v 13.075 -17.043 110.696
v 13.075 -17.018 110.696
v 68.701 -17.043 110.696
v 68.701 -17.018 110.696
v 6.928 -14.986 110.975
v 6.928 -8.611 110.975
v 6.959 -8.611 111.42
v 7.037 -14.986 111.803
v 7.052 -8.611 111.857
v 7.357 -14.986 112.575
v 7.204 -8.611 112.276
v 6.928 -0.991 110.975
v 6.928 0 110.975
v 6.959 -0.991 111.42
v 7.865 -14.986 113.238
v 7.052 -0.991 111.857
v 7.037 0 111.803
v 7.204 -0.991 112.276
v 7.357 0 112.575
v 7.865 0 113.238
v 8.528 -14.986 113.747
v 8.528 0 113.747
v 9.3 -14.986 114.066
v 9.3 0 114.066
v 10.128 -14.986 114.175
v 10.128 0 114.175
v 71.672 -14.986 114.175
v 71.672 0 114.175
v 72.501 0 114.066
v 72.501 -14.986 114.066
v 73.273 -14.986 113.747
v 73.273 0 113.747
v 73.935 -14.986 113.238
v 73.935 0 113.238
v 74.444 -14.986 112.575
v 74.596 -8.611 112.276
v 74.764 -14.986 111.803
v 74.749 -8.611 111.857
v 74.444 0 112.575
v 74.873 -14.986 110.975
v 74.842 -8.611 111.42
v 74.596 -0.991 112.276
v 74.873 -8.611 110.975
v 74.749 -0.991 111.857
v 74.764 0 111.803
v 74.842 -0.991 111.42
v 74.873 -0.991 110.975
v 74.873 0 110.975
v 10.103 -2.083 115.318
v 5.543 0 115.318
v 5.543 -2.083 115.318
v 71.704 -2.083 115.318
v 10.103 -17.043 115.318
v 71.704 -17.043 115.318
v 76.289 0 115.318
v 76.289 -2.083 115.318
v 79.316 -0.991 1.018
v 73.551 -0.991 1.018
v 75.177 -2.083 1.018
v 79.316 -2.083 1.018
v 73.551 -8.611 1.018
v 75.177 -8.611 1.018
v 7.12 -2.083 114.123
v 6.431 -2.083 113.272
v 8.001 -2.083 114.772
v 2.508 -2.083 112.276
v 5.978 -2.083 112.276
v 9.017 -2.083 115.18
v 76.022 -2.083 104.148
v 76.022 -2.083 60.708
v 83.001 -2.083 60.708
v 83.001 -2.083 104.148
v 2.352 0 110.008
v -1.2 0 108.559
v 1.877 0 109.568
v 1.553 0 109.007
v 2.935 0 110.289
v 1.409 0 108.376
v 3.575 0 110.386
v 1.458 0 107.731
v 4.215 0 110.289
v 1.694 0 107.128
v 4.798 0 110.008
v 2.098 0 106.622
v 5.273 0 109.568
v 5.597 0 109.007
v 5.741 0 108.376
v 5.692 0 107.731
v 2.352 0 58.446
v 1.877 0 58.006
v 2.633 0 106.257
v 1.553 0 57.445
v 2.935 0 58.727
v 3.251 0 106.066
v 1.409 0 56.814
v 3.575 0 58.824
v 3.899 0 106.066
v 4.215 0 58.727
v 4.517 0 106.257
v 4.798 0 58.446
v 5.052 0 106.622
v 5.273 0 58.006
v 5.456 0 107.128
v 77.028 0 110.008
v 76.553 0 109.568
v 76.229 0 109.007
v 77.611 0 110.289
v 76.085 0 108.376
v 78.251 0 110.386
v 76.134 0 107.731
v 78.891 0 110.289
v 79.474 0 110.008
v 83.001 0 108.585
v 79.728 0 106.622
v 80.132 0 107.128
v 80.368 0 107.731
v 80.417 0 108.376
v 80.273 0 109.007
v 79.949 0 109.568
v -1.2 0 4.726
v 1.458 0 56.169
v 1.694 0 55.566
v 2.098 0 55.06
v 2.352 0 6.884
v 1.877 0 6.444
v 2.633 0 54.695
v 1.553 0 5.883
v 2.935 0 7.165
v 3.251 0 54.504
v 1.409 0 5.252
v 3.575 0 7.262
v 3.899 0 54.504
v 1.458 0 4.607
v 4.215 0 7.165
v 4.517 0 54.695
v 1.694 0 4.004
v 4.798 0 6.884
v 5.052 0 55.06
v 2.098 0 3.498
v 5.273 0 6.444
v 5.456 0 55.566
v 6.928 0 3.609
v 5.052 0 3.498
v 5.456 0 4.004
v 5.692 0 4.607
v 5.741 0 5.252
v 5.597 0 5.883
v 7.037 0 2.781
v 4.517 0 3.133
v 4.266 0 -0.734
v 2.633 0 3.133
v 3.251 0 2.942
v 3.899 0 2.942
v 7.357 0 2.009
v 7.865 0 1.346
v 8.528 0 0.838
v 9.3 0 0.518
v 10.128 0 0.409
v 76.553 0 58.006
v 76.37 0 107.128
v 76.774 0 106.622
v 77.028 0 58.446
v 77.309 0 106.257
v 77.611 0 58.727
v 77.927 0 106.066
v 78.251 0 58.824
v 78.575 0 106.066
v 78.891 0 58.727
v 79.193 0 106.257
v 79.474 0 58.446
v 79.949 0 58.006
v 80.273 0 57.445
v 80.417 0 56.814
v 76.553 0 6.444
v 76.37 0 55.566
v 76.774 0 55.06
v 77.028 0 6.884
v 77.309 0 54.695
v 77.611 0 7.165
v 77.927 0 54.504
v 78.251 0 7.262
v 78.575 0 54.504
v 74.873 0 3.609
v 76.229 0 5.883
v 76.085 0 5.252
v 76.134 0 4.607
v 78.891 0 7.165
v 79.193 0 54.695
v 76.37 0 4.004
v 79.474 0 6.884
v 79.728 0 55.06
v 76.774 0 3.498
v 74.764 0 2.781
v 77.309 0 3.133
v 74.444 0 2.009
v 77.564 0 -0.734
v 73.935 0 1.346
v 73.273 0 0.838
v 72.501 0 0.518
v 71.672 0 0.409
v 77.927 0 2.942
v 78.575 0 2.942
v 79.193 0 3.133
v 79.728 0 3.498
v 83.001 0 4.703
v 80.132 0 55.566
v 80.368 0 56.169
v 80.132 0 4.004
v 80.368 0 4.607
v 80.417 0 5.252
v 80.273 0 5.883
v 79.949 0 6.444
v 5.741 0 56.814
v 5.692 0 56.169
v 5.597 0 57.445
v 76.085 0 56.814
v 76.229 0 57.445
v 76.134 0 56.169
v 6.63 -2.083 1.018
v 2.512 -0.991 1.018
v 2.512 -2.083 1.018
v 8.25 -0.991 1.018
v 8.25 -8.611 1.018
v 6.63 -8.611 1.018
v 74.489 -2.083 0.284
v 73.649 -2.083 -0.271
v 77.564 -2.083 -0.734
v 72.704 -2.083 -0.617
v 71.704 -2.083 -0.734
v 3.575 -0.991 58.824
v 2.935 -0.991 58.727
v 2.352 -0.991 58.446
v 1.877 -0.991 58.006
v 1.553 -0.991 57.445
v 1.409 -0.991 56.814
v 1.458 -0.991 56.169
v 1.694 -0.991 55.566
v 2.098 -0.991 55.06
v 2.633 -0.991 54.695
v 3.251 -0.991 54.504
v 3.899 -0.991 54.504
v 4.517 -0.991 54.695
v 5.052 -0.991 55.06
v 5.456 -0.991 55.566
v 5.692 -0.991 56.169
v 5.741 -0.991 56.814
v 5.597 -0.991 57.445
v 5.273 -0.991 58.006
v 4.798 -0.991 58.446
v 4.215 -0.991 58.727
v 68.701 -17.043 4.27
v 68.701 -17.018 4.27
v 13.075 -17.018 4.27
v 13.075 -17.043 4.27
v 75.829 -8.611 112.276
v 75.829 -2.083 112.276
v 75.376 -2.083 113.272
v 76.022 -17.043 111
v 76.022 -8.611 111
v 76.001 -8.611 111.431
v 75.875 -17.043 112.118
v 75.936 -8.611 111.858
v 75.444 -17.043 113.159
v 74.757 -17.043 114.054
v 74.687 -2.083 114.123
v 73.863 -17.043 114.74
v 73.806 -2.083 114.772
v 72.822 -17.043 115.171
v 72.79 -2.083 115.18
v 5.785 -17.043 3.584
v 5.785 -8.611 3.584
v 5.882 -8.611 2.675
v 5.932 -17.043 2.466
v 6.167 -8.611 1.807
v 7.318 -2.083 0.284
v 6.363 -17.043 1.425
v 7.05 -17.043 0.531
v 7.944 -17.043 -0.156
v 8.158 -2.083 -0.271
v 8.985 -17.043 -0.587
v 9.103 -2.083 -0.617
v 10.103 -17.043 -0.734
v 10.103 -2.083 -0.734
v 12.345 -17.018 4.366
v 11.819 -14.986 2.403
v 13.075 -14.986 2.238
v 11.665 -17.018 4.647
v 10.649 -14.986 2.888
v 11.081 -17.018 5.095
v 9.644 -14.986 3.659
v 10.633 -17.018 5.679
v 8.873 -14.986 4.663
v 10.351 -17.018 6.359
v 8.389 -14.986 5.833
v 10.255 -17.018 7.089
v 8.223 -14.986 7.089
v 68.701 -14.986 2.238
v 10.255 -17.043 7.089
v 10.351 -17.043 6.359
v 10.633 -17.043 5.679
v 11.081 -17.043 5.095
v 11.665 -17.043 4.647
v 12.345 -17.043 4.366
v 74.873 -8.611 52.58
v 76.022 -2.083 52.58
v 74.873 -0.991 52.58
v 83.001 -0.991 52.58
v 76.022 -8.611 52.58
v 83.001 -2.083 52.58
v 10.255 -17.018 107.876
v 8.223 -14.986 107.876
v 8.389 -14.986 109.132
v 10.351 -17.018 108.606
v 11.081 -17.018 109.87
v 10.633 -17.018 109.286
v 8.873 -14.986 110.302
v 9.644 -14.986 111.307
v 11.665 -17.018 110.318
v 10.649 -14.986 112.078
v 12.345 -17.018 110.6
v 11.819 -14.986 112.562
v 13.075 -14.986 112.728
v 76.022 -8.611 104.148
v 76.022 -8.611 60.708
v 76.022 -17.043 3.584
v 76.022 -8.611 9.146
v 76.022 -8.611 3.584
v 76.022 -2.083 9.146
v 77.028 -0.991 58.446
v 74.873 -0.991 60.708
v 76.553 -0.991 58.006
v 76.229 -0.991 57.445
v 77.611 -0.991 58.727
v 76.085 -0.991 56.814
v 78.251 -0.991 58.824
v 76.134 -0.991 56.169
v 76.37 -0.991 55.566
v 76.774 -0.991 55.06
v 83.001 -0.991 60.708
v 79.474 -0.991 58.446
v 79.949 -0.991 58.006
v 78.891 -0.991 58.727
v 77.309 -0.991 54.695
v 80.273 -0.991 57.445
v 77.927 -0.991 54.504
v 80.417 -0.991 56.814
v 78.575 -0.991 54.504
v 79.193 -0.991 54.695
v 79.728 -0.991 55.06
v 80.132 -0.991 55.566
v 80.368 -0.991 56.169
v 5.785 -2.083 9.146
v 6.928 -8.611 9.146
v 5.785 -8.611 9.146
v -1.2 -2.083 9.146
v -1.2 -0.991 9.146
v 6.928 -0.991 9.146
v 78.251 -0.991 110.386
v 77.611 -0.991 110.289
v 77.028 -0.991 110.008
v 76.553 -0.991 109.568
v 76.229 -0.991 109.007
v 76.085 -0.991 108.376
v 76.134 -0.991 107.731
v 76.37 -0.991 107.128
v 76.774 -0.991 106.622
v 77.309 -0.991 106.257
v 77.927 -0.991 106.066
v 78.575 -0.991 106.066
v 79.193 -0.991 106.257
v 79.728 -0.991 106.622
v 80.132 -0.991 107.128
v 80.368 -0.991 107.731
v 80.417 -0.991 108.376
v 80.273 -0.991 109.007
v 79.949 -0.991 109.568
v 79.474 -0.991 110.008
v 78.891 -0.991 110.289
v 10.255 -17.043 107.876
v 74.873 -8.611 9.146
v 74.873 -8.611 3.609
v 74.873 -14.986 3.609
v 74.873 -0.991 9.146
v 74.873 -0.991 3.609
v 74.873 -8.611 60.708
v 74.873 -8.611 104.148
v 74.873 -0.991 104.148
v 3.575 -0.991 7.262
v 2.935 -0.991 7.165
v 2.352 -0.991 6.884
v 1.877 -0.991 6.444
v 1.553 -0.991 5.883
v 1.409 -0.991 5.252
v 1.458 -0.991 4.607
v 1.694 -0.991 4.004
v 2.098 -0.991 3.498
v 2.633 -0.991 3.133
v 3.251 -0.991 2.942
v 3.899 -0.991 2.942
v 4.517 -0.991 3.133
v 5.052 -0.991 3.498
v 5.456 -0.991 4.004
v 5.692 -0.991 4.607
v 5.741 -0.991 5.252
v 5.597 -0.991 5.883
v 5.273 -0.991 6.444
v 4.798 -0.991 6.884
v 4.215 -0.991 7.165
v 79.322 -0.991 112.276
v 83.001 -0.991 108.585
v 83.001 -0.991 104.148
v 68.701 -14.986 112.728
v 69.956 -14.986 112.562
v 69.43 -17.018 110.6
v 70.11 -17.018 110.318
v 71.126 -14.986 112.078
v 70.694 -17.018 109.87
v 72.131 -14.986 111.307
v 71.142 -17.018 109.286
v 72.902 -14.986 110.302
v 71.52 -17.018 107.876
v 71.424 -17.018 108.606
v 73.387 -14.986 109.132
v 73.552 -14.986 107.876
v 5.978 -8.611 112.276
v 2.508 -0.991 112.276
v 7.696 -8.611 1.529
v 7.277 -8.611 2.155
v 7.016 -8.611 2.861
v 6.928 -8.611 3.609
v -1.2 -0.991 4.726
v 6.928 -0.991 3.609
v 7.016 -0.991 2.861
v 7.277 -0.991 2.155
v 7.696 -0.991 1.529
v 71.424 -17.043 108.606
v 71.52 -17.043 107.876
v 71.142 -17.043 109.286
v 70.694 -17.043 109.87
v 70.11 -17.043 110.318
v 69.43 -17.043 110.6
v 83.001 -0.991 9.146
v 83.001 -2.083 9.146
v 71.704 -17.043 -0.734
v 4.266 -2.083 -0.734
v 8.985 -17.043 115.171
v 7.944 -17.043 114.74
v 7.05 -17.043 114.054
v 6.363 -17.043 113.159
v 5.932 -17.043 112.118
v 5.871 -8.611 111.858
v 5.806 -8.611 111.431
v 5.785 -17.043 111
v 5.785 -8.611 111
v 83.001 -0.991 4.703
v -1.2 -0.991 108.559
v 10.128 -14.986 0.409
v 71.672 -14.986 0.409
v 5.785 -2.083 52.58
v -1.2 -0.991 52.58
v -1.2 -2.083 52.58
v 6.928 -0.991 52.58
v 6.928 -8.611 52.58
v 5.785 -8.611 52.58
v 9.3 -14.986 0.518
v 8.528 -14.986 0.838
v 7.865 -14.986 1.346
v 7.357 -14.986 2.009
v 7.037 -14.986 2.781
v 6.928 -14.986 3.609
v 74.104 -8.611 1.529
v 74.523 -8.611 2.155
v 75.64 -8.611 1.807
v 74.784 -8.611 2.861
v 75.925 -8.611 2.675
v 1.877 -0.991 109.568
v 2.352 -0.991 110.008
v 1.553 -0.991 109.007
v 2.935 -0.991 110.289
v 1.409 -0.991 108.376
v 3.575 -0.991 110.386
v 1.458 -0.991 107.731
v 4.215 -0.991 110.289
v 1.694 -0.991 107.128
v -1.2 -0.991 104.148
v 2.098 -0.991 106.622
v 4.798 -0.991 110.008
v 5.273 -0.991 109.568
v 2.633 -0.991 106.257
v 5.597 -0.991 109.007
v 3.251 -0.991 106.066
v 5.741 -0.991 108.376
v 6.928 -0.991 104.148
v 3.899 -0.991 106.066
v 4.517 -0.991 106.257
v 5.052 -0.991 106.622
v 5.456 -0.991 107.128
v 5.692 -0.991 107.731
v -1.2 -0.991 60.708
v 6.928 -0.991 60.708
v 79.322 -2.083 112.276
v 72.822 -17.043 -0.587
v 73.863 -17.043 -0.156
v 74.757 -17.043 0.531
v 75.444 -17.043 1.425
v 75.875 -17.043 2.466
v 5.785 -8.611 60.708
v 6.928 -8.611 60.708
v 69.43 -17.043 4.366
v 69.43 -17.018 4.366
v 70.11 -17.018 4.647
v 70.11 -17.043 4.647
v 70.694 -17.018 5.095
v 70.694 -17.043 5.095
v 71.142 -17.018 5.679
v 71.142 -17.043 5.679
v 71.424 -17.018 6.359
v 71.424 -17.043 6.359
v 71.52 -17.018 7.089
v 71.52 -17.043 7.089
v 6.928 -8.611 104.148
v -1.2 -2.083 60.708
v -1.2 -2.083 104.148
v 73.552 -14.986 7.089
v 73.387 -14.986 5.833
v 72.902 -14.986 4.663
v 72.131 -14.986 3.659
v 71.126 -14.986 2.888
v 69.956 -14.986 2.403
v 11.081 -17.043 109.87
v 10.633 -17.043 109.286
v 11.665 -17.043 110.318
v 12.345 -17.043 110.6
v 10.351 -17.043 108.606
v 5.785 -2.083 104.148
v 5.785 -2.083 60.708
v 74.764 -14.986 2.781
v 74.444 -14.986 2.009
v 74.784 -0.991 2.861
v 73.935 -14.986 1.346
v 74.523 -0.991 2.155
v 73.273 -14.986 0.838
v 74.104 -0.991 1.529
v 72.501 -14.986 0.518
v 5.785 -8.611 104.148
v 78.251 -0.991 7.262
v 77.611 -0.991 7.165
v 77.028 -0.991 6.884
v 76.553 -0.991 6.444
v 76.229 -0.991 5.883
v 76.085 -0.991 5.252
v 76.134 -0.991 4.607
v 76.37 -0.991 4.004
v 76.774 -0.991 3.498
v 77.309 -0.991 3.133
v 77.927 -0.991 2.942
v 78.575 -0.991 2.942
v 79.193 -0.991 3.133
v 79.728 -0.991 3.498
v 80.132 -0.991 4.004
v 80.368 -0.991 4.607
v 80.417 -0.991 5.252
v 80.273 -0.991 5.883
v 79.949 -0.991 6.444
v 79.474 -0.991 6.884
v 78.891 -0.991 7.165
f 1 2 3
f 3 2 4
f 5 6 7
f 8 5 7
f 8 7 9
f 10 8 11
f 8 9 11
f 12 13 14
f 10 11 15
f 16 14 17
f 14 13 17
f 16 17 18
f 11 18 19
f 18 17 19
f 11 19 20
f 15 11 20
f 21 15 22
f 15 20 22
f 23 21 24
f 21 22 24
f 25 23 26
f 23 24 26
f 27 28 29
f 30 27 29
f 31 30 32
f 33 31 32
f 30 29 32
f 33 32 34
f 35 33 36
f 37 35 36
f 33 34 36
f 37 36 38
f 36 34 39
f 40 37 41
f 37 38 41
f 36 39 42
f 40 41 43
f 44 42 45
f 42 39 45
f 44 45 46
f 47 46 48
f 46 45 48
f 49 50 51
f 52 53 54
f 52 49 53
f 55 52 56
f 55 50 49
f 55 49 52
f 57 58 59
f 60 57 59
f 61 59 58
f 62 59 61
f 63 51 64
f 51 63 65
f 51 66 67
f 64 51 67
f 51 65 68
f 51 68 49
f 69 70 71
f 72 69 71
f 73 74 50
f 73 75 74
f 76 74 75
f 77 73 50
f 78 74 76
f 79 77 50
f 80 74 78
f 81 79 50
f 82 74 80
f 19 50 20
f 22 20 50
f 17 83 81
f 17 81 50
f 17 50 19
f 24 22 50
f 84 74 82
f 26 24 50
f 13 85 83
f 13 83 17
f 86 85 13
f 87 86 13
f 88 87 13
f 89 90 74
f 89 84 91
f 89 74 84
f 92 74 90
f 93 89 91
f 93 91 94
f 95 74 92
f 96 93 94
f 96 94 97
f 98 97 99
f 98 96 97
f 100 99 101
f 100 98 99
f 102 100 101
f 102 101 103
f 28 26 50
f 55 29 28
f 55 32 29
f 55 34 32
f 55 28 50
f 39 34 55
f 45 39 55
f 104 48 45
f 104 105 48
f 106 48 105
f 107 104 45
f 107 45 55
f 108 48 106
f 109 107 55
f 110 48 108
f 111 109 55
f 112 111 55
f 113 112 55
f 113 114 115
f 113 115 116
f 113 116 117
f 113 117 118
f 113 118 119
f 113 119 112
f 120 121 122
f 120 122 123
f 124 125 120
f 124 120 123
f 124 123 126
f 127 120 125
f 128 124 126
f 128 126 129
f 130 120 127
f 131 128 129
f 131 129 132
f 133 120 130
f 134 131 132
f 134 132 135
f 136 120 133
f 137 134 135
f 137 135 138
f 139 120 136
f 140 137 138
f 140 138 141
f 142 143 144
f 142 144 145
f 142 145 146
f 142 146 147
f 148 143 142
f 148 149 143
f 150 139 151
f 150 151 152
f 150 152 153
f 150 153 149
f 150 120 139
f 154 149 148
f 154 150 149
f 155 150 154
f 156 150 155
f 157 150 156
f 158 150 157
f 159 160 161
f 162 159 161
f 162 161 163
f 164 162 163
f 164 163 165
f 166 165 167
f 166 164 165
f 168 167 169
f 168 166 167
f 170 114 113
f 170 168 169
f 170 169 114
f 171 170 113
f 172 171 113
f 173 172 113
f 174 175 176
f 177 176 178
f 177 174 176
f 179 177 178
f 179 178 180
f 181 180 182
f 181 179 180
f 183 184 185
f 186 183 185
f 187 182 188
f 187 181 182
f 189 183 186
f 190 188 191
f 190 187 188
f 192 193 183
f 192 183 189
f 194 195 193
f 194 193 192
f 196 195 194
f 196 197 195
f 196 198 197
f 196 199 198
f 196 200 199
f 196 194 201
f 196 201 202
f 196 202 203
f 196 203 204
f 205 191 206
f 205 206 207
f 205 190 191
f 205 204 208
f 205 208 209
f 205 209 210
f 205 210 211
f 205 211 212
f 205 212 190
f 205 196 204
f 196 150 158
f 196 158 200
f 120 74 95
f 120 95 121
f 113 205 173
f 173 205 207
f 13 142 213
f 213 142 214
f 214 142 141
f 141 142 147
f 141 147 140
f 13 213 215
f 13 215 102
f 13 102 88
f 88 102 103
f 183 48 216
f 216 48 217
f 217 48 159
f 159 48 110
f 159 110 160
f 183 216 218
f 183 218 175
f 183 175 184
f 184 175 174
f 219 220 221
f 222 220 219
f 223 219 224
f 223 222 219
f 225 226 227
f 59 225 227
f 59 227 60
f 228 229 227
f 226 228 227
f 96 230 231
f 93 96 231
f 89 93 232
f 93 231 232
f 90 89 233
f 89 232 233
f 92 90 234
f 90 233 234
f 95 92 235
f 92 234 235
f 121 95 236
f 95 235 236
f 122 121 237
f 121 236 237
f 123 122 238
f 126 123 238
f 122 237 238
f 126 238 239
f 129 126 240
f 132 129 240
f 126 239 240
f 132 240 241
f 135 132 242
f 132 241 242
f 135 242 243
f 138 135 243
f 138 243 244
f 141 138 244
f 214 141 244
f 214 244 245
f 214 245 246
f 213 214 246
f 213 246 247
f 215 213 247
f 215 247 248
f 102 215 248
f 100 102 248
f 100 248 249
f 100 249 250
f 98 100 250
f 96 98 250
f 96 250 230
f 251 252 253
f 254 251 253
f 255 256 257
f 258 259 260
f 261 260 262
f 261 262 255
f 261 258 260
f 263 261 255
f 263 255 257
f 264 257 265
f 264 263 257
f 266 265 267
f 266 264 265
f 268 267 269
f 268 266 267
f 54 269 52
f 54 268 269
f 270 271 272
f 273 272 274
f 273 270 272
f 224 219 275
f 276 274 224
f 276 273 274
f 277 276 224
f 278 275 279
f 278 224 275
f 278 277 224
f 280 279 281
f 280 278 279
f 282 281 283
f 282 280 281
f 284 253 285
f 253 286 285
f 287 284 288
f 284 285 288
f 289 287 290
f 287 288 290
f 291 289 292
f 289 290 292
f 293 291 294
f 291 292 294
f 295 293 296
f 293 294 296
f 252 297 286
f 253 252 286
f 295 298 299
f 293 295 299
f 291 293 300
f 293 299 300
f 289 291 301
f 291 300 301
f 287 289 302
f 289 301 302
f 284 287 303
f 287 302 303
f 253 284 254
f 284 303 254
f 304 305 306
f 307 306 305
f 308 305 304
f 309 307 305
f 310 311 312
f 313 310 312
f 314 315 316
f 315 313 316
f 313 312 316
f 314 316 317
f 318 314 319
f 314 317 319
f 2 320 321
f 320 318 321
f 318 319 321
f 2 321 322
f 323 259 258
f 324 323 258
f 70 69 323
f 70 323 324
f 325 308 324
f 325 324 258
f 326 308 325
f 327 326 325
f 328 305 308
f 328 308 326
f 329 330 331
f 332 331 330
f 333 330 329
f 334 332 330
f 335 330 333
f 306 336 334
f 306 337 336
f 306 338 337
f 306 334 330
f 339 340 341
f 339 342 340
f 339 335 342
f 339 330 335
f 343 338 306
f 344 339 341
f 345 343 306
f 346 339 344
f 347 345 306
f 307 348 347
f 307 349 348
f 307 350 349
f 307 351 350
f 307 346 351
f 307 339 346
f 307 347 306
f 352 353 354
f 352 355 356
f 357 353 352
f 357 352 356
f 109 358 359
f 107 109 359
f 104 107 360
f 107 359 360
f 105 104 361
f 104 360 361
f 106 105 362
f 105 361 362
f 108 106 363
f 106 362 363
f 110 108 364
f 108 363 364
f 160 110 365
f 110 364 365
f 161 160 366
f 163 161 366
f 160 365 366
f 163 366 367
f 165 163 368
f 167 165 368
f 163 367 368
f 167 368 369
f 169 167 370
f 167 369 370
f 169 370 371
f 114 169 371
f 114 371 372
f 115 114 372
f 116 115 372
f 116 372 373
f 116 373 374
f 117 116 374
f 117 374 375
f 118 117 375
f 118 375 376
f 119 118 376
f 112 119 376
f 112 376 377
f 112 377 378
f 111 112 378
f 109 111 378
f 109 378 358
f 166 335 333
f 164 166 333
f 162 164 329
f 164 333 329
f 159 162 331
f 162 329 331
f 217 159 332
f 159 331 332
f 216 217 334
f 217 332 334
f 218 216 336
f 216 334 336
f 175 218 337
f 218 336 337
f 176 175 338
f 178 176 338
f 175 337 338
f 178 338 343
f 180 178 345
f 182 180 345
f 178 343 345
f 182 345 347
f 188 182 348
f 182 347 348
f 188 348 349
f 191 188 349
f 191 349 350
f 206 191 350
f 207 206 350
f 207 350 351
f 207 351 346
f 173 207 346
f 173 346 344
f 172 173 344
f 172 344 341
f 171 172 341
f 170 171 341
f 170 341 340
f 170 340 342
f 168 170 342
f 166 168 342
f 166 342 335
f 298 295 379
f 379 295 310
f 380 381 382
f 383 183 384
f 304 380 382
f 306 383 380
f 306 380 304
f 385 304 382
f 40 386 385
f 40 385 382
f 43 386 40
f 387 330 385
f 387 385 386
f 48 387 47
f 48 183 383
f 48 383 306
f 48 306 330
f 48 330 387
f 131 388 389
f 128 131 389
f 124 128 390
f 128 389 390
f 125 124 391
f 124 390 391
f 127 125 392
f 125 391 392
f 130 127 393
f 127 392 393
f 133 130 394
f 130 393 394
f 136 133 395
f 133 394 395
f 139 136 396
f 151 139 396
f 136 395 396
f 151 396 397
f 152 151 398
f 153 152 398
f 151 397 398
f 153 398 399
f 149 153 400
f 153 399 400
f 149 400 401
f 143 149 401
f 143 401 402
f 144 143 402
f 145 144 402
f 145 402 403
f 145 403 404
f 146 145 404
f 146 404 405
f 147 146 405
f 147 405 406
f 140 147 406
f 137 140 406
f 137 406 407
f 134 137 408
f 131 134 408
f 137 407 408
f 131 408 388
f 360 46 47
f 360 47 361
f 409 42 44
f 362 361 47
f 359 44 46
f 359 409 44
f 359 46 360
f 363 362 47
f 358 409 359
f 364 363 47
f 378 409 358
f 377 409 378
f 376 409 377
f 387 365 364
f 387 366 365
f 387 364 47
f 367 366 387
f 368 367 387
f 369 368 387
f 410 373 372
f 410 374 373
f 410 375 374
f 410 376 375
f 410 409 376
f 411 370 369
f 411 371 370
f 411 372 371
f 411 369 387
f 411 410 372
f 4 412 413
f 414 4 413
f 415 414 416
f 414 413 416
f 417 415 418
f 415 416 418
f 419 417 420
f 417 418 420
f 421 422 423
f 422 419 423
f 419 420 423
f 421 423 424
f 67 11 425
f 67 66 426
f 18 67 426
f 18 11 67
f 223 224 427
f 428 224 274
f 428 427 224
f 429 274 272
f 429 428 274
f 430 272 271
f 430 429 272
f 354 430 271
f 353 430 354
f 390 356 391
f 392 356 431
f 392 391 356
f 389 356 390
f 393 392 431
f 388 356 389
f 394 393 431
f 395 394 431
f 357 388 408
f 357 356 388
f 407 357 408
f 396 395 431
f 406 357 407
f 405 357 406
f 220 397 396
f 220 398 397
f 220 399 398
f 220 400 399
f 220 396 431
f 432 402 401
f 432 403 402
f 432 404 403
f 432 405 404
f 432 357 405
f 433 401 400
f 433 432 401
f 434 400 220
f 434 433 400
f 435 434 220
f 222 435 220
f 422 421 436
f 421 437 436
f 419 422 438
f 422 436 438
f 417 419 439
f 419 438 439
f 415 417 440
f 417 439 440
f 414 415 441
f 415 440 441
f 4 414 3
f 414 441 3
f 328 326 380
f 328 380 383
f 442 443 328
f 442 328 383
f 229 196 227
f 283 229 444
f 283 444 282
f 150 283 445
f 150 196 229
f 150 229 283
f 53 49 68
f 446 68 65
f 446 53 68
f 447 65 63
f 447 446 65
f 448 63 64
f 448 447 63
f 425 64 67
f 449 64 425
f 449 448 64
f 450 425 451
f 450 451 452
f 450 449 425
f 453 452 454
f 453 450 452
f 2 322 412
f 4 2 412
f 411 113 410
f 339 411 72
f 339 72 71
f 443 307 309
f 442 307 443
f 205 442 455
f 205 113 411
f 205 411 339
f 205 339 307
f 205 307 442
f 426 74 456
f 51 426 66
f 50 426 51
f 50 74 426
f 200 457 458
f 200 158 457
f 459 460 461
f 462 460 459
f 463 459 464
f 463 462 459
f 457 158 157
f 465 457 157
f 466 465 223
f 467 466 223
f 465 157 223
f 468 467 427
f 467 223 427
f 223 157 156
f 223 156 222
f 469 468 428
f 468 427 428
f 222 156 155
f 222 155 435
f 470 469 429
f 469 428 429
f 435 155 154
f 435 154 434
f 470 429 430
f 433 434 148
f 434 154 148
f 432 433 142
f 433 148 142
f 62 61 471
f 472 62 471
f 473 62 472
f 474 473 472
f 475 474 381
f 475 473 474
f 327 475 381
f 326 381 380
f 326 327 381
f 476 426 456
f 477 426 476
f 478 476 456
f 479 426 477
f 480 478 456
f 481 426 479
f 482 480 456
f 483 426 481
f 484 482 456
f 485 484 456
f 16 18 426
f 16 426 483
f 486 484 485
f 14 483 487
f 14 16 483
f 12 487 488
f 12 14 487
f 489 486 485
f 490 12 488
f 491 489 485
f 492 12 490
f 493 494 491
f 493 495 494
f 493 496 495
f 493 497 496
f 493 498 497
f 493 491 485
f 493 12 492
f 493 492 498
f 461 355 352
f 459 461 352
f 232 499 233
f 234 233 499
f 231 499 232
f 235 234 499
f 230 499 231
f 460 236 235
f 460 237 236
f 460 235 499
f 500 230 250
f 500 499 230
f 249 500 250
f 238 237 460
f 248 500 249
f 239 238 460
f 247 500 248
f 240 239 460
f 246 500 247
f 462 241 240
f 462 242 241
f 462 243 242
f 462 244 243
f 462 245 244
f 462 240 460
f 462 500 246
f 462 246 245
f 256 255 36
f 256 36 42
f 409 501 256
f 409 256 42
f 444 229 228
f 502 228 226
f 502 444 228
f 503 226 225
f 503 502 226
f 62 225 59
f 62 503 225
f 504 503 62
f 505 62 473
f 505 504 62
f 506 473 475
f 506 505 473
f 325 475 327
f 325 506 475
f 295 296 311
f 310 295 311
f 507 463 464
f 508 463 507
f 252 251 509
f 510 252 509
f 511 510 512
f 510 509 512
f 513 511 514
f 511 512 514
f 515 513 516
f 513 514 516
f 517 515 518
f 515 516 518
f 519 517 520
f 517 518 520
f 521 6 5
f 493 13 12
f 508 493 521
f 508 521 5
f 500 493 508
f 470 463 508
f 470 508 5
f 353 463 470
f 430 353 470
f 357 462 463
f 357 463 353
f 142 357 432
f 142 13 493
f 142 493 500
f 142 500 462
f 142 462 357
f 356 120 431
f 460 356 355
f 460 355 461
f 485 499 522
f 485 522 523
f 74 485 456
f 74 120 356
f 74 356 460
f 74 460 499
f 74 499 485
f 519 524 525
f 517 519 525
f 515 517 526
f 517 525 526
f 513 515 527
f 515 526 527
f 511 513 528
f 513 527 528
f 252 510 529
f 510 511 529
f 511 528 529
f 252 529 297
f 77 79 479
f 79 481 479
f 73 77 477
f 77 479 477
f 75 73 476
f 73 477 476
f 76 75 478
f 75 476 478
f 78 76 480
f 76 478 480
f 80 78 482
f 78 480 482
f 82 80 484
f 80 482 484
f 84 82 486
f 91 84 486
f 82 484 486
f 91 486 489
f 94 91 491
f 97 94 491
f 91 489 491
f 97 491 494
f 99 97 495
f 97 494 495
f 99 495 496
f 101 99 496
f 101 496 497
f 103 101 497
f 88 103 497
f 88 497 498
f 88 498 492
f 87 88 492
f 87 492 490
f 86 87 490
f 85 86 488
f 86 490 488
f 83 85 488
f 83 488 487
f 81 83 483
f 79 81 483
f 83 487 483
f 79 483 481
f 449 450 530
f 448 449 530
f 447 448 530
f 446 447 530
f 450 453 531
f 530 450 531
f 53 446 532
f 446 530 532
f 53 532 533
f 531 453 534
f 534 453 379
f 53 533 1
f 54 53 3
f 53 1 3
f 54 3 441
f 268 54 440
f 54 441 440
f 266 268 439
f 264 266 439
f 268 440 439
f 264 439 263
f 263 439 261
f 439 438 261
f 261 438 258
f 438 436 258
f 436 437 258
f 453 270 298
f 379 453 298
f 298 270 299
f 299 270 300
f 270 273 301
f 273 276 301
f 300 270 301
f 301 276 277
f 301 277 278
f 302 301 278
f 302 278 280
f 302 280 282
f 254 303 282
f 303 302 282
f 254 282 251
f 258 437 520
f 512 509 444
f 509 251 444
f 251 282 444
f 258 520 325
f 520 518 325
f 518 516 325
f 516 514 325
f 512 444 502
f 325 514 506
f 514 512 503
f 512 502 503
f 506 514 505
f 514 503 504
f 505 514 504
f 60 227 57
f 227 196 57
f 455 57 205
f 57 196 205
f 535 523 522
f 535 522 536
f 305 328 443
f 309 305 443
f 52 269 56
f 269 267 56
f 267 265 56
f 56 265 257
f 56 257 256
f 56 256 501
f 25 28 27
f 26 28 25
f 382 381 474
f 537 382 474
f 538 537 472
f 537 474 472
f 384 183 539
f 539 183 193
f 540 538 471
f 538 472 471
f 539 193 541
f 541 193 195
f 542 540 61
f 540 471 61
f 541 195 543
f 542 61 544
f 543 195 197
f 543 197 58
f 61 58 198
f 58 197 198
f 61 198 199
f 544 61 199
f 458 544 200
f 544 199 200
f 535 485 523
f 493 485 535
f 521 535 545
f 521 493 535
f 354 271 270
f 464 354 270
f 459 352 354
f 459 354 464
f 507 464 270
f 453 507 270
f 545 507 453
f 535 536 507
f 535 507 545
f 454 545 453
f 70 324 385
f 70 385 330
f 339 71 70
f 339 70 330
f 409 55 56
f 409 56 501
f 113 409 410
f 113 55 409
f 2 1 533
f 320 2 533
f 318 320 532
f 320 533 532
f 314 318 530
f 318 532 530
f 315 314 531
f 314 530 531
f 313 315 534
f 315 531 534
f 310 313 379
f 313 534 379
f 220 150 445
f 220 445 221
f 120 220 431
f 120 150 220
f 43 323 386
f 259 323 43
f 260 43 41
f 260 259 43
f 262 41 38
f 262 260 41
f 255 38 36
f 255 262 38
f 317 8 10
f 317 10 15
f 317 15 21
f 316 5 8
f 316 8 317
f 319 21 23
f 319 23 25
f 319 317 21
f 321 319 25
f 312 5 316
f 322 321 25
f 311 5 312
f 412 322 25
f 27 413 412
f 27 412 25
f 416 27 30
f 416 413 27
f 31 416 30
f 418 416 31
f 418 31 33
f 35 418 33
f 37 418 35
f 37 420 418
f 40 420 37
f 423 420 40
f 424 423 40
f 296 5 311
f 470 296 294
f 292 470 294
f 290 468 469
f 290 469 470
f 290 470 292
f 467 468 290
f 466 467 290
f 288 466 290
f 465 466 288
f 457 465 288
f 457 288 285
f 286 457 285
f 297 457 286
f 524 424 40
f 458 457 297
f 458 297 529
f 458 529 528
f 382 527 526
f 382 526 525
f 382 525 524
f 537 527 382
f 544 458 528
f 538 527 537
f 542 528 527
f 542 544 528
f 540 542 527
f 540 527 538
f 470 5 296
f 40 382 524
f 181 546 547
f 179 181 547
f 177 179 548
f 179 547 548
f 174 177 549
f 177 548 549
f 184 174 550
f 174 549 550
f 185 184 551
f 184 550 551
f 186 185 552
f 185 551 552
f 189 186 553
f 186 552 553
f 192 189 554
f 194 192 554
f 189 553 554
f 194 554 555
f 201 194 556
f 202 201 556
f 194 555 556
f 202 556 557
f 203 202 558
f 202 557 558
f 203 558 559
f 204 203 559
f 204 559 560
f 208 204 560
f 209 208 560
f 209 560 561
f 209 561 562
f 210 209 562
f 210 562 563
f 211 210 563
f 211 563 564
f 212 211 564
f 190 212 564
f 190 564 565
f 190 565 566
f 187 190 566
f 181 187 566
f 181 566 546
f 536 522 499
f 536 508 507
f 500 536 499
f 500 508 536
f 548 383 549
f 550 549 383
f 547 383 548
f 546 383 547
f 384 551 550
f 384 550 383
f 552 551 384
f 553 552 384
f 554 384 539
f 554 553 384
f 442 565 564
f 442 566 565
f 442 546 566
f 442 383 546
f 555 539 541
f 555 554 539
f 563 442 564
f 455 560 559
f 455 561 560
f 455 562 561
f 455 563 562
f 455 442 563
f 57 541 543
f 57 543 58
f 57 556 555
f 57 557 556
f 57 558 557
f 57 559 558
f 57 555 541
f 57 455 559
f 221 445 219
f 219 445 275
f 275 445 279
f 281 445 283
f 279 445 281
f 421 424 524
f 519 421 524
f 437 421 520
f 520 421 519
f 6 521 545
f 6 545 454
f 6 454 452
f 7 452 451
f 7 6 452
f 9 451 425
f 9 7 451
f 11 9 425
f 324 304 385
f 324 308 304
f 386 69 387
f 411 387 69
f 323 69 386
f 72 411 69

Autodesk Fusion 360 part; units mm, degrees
sketch "Front" plane through (0, 0, 0) normal (0, 1, 0) x (1, 0, 0) in component "2004699A"
  line L0 (-34.4613, 0.7342) -> (100.7673, 0.7342) construction
  line L1 (-34.854, -115.3184) -> (120.0108, -115.3184) construction
  line L2 (39.1093, -14.9122) -> (120.6654, -14.9122) construction
  line L3 (3.575, 24.5274) -> (3.575, -141.9882) construction
  line L4 (78.251, 23.8729) -> (78.251, -119.9956) construction
  line L5 (-16.7886, -108.2138) -> (88.0691, -108.2138) construction
  line L6 (-18.2286, -5.0898) -> (85.3201, -5.0898) construction
  line L7 (-8.6723, -56.6518) -> (96.0546, -56.6518) construction
  line L8 (-24.3813, -113.9722) -> (90.4255, -113.9722) construction
  line L9 (-27.0881, -0.4088) -> (83.5136, -0.4088) construction
  line L10 (10.2552, -130.527) -> (10.2552, 10.1996) construction
  line L11 (71.52, -130.1852) -> (71.52, 12.6775) construction
  line L12 (5.7848, -130.0998) -> (5.7848, 6.3546) construction
  line L13 (83.0008, -137.1267) -> (83.0008, 10.6162) construction
  line L14 (-1.2002, -137.339) -> (-1.2002, 17.644) construction
  line L15 (110.5413, -110.6956) -> (5.7848, -110.6956) construction
  line L16 (110.1974, -4.2696) -> (-2.9547, -4.2696) construction
  line L17 (102.8889, -60.7158) -> (-8.8875, -60.7158) construction
  line L18 (102.459, -52.5878) -> (-11.4669, -52.5878) construction
  line L19 (40.913, -17.1802) -> (40.913, 17.1835) construction
  line L20 (69.6478, 8.6501) -> (89.4046, -11.1067) construction
  line L21 (-5.4342, -8.9542) -> (10.2552, 6.7154) construction
  line L22 (-6.1303, -103.6453) -> (12.6902, -122.4658) construction
  line L23 (73.7302, -117.8806) -> (90.3753, -101.2137) construction
  line L24 (-2.868, -104.1498) -> (87.443, -104.1498) construction
  line L25 (-3.4391, -112.2778) -> (87.0011, -112.2778) construction
  line L26 (-3.1536, -9.1538) -> (86.0732, -9.1538) construction
  line L27 (-3.3677, -1.0258) -> (85.288, -1.0258) construction
  line L28 (10.2552, -110.6956) -> (71.52, -110.6956)
  line L29 (71.52, -110.6956) -> (71.52, -4.2696)
  line L30 (71.52, -4.2696) -> (10.2552, -4.2696)
  line L31 (10.2552, -4.2696) -> (10.2552, -110.6956)
  line L32 (-1.2002, -115.3184) -> (83.0008, -115.3184)
  line L33 (83.0008, -115.3184) -> (83.0008, 0.7342)
  line L34 (83.0008, 0.7342) -> (-1.2002, 0.7342)
  line L35 (-1.2002, 0.7342) -> (-1.2002, -115.3184)
  line L36 (76.0158, -119.9569) -> (76.0158, 9.6762) construction
  line L37 (5.7848, -115.3184) -> (76.0222, -115.3184) construction
  line L38 (76.0222, -115.3184) -> (76.0222, 0.7342) construction
  line L39 (76.0222, 0.7342) -> (5.7848, 0.7342) construction
  line L40 (5.7848, 0.7342) -> (5.7848, -115.3184) construction
  line L41 (76.0222, 0.7342) -> (5.7848, 0.7342)
  line L42 (5.7848, 0.7342) -> (5.7848, -115.3184)
  line L43 (5.7848, -115.3184) -> (76.0222, -115.3184)
  line L44 (76.0222, -115.3184) -> (76.0222, 0.7342)
  line L45 (-1.2002, -108.5588) -> (5.5429, -115.3184)
  line L46 (76.2891, -115.3184) -> (83.0008, -108.585)
  line L47 (77.5637, 0.7342) -> (83.0008, -4.7029)
  line L48 (4.2664, 0.7342) -> (-1.2002, -4.7255)
  point P0 (3.575, -108.2138)
  point P1 (78.251, -108.2138)
  point P2 (78.251, -56.6518)
  point P3 (78.251, -5.0898)
  point P4 (3.575, -5.0898)
  point P5 (3.575, -56.6518)
  dimension "d1" = 1.143
  dimension "d2" = 116.0526
  dimension "d3" = 113.5634
  dimension "d4" = 103.124
  dimension "d5" = 51.562
  dimension "d6" = 74.676
  dimension "d7" = 2.2098
  dimension "d8" = 4.4704
  dimension "d9" = 61.2648
  dimension "d10" = 84.201
  dimension "d11" = 6.985
  dimension "d12" = 106.426
  dimension "d13" = 4.6228
  dimension "d14" = 100.4062
  dimension "d15" = 37.338
  dimension "d16" = 8.128
  dimension "d17" = 4.064
  dimension "d18" = 3.6322
  dimension "d19" = 3.6322
  dimension "d20" = 3.6322
  dimension "d21" = 3.6322
  dimension "d22" = 4.064
  dimension "d23" = 8.128
  dimension "d25" = 4.064
  dimension "d26" = 8.128
  dimension "d27" = 70.231
extrude "Extrude1" add sketch "Front" against normal blind 17.0434 contours L32 L34 L41 L42 L43 L44 in component "2004699A"
extrude "Extrude2" add sketch "Front" against normal blind 2.0828 contours L32 L34 L35 L42 L45 L48 | L32 L33 L34 L44 L46 L47 in component "2004699A"
fillet "Fillet1" radius 4.318 4 edges at (5.7848, -9.5631, -0.7342) (76.0222, -9.5631, -0.7342) (76.0222, -9.5631, 115.3184) (5.7848, -9.5631, 115.3184) in component "2004699A"
fillet "Fillet2" radius 2.8194 4 edges at (71.52, -8.5217, 110.6956) (10.2552, -8.5217, 110.6956) (71.52, -8.5217, 4.2696) (10.2552, -8.5217, 4.2696) in component "2004699A"
hole "Hole1" at (78.251, 0, 108.2138) at (78.251, 0, 56.6518) at (78.251, 0, 5.0898) at (3.575, 0, 5.0898) at (3.575, 0, 56.6518) at (3.575, 0, 108.2138) direction (0, -1, 0) diameter 4.3434 end through all in component "2004699A"
sketch "Sketch3" plane through (0, 0, 0) normal (0, 1, 0) x (1, 0, 0) in component "2004699A"
  line L0 (88.5571, -114.1754) -> (-29.017, -114.1754) construction
  line L1 (6.9278, -119.135) -> (6.9278, -3.6092) construction
  line L2 (74.8728, -110.975) -> (74.8728, 6.1599) construction
  line L3 (95.5329, -0.4088) -> (-26.782, -0.4088) construction
  line L4 (-34.4613, 0.7342) -> (100.7673, 0.7342) construction
  line L5 (5.7848, -130.0998) -> (5.7848, 6.3546) construction
  line L6 (-34.854, -115.3184) -> (120.0108, -115.3184) construction
  line L7 (76.0158, -119.9569) -> (76.0158, 9.6762) construction
  line L8 (71.6724, -114.1754) -> (10.1282, -114.1754)
  line L9 (6.9278, -110.975) -> (6.9278, -0.4088)
  line L10 (10.1282, -0.4088) -> (71.6724, -0.4088)
  line L11 (74.8728, -3.6092) -> (74.8728, -114.1754)
  arc A0 (74.8728, -3.6092) -> (71.6724, -0.4088) centre (71.6724, -3.6092) ccw
  arc A1 (10.1282, -0.4088) -> (6.9278, -3.6092) centre (10.1282, -3.6092) ccw
  arc A2 (71.6724, -114.1754) -> (74.8728, -110.975) centre (71.6724, -110.975) ccw
  arc A3 (6.9278, -110.975) -> (10.1282, -114.1754) centre (10.1282, -110.975) ccw
  dimension "d37" = 1.143
  dimension "d38" = 1.143
  dimension "d39" = 1.143
  dimension "d40" = 1.143
  dimension "d41" = 3.2004
  dimension "d42" = 3.2004
  dimension "d43" = 3.2004
  dimension "d44" = 3.2004
extrude "Extrude3" cut sketch "Sketch3" against normal blind 14.986 in component "2004699A"
chamfer "Chamfer1" distance 2.032 angle 45 8 edges at (40.8876, -14.986, 4.2696) (11.081, -14.986, 5.0954) (10.2552, -14.986, 57.4826) (11.081, -14.986, 109.8698) (40.8876, -14.986, 110.6956) (70.6942, -14.986, 109.8698) (71.52, -14.986, 57.4826) (70.6942, -14.986, 5.0954) in component "2004699A"
sketch "Sketch4" plane through (83.0008, 0, 0) normal (1, 0, 0) x (0, 1, 0) in component "2004699A"
  line L0 (0, 4.7029) -> (0, 108.585)
  line L1 (0, 108.585) -> (-2.0828, 108.585)
  line L2 (-2.0828, 108.585) -> (-2.0828, 4.7029)
  line L3 (-2.0828, 4.7029) -> (0, 4.7029)
  line L4 (-0.9906, 121.8672) -> (-0.9906, -5.2486) construction
  line L5 (0, 108.2121) -> (-3.3976, 108.2121) construction
  line L6 (0, 56.644) -> (-3.817, 56.644) construction
  line L7 (0, 0) -> (-1.1062, 0) construction
  line L8 (1.8872, 112.2761) -> (-9.9271, 112.2761) construction
  line L9 (1.8112, 104.1481) -> (-10.4595, 104.1481) construction
  line L10 (1.71, 60.708) -> (-9.8241, 60.708) construction
  line L11 (2.1656, 52.58) -> (0.9254, 52.58) construction
  line L12 (0.9254, 52.58) -> (-9.5412, 52.58) construction
  line L13 (0, 5.0822) -> (-6.1548, 5.0822) construction
  line L14 (2.1892, 9.1462) -> (-10.0058, 9.1462) construction
  line L15 (2.6197, 1.0182) -> (-10.581, 1.0182) construction
  line L16 (-8.6106, 122.6091) -> (-8.6106, -10.4565) construction
  line L17 (-8.6106, 60.708) -> (-0.9906, 60.708)
  line L18 (-0.9906, 60.708) -> (-0.9906, 52.58)
  line L19 (-0.9906, 52.58) -> (-8.6106, 52.58)
  line L20 (-8.6106, 52.58) -> (-8.6106, 60.708)
  line L21 (-8.6106, 9.1462) -> (-0.9906, 9.1462)
  line L22 (-0.9906, 9.1462) -> (-0.9906, 1.0182)
  line L23 (-0.9906, 1.0182) -> (-8.6106, 1.0182)
  line L24 (-8.6106, 1.0182) -> (-8.6106, 9.1462)
  line L25 (-8.6106, 112.2761) -> (-0.9906, 112.2761)
  line L26 (-0.9906, 112.2761) -> (-0.9906, 104.1481)
  line L27 (-0.9906, 104.1481) -> (-8.6106, 104.1481)
  line L28 (-8.6106, 104.1481) -> (-8.6106, 112.2761)
  point P0 (0, 119.9956)
  dimension "d48" = 0.9906
  dimension "d49" = 4.064
  dimension "d50" = 8.128
  dimension "d51" = 4.064
  dimension "d52" = 8.128
  dimension "d54" = 4.064
  dimension "d55" = 8.128
  dimension "d56" = 7.62
extrude "Extrude4" cut sketch "Sketch4" against normal through all contours L2 L3 L21 L22 L23 L24 | L2 L3 L21 L22 | L1 L2 L26 L27 | L1 L2 L25 L26 L27 L28 | L2 L17 L19 L20 | L2 L17 L18 L19 in component "2004699A"
component "2004699A" placed x (1, 0, 0) y (0, 1, 0) z (0, 0, 1) at (0, 0, 0)
equation "d41 = 0.171 in - 0.045 in"
equation "d42 = 0.171 in - 0.045 in"
equation "d43 = 0.171 in - 0.045 in"
equation "d44 = 0.171 in - 0.045 in"
